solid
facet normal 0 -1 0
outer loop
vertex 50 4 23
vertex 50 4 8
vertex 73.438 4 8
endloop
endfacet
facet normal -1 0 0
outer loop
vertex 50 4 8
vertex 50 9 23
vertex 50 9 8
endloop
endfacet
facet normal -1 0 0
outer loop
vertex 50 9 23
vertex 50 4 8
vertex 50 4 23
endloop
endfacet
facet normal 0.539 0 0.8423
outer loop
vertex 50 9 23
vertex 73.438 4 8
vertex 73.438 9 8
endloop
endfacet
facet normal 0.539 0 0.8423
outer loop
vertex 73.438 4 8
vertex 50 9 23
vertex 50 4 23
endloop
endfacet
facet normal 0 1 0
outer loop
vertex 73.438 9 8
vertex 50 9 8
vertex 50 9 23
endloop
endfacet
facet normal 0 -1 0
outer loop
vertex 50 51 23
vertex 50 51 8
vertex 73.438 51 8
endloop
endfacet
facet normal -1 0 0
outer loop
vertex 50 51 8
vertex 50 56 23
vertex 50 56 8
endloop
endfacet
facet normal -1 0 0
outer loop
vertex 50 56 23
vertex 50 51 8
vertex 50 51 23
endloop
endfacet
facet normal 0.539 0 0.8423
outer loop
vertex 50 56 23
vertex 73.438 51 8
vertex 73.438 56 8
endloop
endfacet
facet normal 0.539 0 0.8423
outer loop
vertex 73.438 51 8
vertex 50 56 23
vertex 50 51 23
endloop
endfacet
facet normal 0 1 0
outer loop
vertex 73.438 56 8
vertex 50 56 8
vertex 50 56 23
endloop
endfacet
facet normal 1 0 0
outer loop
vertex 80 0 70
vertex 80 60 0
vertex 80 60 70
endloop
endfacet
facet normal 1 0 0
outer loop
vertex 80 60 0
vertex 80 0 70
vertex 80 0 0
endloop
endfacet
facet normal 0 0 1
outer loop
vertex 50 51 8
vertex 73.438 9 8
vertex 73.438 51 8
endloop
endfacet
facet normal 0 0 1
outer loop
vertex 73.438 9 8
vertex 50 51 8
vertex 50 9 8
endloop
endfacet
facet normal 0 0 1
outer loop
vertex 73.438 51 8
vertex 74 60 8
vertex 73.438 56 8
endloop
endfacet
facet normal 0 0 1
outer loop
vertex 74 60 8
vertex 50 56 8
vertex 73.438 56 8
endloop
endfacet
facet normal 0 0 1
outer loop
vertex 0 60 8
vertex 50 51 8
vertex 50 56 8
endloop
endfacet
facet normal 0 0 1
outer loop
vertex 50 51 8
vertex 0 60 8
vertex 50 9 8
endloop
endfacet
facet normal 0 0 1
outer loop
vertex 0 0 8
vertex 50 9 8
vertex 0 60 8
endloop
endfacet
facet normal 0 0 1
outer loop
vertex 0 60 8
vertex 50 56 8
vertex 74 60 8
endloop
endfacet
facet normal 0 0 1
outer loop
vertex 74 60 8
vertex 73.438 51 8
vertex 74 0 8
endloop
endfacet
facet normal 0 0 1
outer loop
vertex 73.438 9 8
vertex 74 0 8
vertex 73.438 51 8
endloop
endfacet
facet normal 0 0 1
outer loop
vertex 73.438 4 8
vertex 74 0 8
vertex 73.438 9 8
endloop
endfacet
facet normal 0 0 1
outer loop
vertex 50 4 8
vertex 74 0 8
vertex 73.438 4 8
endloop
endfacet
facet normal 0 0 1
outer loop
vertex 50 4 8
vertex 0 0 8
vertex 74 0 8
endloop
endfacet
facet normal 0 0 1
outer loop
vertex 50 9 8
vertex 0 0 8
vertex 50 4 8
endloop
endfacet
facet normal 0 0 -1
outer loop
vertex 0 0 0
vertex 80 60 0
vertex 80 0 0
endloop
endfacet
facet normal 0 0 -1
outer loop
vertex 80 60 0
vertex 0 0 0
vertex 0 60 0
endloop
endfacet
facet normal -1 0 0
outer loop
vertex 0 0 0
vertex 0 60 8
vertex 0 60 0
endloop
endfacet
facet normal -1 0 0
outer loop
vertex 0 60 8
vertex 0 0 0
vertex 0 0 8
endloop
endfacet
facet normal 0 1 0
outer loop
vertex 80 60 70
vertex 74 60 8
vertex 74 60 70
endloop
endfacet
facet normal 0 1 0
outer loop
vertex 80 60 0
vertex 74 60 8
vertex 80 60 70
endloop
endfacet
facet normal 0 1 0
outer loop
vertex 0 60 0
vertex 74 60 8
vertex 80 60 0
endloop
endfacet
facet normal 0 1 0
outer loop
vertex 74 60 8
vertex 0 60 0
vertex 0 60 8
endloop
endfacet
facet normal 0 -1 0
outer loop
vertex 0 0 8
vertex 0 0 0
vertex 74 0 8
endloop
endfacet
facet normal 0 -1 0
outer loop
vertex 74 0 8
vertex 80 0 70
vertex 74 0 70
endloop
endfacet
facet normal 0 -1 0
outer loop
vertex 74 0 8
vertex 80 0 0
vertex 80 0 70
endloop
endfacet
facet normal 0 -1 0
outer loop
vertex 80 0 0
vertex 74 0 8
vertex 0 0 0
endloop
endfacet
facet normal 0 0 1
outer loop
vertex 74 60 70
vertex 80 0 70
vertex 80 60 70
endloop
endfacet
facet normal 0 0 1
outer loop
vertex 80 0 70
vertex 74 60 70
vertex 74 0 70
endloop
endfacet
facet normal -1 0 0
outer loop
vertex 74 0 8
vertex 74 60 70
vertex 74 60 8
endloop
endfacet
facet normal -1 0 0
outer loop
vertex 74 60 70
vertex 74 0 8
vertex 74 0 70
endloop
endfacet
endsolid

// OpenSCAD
$fn = 32;

// ----------------------------------------------------------------------
// Rib bracket: 2-gusset L bracket
// ----------------------------------------------------------------------

// --- parameters (mm) ---
base_l = 80;              // foot length, X
base_w = 60;              // foot width, Y
base_t = 8;               // foot thickness
plate_t = 6;              // upright plate thickness
plate_h = 70;             // overall height
gus_l = 24;               // gusset leg along the foot
gus_h = 16;               // gusset height
gus_t = 5;                // gusset thickness
gus_edge = 4;             // gusset margin from the foot edge
n_gus = 2;                // gusset count

gus_pitch = (base_w - 2 * gus_edge - gus_t) / (n_gus - 1);  // gusset pitch

union() {
  cube([base_l, base_w, base_t]);
  translate([base_l - plate_t, 0, base_t - 1])
    cube([plate_t, base_w, plate_h - base_t + 1]);
  for (i = [0 : n_gus - 1])
    translate([base_l - plate_t - gus_l, gus_edge + i * gus_pitch, base_t - 1])
      rotate([-90, 0, 0])
        linear_extrude(height = gus_t)
          polygon(points = [[0, 0], [gus_l + 1, 0], [0, -gus_h]]);
}
